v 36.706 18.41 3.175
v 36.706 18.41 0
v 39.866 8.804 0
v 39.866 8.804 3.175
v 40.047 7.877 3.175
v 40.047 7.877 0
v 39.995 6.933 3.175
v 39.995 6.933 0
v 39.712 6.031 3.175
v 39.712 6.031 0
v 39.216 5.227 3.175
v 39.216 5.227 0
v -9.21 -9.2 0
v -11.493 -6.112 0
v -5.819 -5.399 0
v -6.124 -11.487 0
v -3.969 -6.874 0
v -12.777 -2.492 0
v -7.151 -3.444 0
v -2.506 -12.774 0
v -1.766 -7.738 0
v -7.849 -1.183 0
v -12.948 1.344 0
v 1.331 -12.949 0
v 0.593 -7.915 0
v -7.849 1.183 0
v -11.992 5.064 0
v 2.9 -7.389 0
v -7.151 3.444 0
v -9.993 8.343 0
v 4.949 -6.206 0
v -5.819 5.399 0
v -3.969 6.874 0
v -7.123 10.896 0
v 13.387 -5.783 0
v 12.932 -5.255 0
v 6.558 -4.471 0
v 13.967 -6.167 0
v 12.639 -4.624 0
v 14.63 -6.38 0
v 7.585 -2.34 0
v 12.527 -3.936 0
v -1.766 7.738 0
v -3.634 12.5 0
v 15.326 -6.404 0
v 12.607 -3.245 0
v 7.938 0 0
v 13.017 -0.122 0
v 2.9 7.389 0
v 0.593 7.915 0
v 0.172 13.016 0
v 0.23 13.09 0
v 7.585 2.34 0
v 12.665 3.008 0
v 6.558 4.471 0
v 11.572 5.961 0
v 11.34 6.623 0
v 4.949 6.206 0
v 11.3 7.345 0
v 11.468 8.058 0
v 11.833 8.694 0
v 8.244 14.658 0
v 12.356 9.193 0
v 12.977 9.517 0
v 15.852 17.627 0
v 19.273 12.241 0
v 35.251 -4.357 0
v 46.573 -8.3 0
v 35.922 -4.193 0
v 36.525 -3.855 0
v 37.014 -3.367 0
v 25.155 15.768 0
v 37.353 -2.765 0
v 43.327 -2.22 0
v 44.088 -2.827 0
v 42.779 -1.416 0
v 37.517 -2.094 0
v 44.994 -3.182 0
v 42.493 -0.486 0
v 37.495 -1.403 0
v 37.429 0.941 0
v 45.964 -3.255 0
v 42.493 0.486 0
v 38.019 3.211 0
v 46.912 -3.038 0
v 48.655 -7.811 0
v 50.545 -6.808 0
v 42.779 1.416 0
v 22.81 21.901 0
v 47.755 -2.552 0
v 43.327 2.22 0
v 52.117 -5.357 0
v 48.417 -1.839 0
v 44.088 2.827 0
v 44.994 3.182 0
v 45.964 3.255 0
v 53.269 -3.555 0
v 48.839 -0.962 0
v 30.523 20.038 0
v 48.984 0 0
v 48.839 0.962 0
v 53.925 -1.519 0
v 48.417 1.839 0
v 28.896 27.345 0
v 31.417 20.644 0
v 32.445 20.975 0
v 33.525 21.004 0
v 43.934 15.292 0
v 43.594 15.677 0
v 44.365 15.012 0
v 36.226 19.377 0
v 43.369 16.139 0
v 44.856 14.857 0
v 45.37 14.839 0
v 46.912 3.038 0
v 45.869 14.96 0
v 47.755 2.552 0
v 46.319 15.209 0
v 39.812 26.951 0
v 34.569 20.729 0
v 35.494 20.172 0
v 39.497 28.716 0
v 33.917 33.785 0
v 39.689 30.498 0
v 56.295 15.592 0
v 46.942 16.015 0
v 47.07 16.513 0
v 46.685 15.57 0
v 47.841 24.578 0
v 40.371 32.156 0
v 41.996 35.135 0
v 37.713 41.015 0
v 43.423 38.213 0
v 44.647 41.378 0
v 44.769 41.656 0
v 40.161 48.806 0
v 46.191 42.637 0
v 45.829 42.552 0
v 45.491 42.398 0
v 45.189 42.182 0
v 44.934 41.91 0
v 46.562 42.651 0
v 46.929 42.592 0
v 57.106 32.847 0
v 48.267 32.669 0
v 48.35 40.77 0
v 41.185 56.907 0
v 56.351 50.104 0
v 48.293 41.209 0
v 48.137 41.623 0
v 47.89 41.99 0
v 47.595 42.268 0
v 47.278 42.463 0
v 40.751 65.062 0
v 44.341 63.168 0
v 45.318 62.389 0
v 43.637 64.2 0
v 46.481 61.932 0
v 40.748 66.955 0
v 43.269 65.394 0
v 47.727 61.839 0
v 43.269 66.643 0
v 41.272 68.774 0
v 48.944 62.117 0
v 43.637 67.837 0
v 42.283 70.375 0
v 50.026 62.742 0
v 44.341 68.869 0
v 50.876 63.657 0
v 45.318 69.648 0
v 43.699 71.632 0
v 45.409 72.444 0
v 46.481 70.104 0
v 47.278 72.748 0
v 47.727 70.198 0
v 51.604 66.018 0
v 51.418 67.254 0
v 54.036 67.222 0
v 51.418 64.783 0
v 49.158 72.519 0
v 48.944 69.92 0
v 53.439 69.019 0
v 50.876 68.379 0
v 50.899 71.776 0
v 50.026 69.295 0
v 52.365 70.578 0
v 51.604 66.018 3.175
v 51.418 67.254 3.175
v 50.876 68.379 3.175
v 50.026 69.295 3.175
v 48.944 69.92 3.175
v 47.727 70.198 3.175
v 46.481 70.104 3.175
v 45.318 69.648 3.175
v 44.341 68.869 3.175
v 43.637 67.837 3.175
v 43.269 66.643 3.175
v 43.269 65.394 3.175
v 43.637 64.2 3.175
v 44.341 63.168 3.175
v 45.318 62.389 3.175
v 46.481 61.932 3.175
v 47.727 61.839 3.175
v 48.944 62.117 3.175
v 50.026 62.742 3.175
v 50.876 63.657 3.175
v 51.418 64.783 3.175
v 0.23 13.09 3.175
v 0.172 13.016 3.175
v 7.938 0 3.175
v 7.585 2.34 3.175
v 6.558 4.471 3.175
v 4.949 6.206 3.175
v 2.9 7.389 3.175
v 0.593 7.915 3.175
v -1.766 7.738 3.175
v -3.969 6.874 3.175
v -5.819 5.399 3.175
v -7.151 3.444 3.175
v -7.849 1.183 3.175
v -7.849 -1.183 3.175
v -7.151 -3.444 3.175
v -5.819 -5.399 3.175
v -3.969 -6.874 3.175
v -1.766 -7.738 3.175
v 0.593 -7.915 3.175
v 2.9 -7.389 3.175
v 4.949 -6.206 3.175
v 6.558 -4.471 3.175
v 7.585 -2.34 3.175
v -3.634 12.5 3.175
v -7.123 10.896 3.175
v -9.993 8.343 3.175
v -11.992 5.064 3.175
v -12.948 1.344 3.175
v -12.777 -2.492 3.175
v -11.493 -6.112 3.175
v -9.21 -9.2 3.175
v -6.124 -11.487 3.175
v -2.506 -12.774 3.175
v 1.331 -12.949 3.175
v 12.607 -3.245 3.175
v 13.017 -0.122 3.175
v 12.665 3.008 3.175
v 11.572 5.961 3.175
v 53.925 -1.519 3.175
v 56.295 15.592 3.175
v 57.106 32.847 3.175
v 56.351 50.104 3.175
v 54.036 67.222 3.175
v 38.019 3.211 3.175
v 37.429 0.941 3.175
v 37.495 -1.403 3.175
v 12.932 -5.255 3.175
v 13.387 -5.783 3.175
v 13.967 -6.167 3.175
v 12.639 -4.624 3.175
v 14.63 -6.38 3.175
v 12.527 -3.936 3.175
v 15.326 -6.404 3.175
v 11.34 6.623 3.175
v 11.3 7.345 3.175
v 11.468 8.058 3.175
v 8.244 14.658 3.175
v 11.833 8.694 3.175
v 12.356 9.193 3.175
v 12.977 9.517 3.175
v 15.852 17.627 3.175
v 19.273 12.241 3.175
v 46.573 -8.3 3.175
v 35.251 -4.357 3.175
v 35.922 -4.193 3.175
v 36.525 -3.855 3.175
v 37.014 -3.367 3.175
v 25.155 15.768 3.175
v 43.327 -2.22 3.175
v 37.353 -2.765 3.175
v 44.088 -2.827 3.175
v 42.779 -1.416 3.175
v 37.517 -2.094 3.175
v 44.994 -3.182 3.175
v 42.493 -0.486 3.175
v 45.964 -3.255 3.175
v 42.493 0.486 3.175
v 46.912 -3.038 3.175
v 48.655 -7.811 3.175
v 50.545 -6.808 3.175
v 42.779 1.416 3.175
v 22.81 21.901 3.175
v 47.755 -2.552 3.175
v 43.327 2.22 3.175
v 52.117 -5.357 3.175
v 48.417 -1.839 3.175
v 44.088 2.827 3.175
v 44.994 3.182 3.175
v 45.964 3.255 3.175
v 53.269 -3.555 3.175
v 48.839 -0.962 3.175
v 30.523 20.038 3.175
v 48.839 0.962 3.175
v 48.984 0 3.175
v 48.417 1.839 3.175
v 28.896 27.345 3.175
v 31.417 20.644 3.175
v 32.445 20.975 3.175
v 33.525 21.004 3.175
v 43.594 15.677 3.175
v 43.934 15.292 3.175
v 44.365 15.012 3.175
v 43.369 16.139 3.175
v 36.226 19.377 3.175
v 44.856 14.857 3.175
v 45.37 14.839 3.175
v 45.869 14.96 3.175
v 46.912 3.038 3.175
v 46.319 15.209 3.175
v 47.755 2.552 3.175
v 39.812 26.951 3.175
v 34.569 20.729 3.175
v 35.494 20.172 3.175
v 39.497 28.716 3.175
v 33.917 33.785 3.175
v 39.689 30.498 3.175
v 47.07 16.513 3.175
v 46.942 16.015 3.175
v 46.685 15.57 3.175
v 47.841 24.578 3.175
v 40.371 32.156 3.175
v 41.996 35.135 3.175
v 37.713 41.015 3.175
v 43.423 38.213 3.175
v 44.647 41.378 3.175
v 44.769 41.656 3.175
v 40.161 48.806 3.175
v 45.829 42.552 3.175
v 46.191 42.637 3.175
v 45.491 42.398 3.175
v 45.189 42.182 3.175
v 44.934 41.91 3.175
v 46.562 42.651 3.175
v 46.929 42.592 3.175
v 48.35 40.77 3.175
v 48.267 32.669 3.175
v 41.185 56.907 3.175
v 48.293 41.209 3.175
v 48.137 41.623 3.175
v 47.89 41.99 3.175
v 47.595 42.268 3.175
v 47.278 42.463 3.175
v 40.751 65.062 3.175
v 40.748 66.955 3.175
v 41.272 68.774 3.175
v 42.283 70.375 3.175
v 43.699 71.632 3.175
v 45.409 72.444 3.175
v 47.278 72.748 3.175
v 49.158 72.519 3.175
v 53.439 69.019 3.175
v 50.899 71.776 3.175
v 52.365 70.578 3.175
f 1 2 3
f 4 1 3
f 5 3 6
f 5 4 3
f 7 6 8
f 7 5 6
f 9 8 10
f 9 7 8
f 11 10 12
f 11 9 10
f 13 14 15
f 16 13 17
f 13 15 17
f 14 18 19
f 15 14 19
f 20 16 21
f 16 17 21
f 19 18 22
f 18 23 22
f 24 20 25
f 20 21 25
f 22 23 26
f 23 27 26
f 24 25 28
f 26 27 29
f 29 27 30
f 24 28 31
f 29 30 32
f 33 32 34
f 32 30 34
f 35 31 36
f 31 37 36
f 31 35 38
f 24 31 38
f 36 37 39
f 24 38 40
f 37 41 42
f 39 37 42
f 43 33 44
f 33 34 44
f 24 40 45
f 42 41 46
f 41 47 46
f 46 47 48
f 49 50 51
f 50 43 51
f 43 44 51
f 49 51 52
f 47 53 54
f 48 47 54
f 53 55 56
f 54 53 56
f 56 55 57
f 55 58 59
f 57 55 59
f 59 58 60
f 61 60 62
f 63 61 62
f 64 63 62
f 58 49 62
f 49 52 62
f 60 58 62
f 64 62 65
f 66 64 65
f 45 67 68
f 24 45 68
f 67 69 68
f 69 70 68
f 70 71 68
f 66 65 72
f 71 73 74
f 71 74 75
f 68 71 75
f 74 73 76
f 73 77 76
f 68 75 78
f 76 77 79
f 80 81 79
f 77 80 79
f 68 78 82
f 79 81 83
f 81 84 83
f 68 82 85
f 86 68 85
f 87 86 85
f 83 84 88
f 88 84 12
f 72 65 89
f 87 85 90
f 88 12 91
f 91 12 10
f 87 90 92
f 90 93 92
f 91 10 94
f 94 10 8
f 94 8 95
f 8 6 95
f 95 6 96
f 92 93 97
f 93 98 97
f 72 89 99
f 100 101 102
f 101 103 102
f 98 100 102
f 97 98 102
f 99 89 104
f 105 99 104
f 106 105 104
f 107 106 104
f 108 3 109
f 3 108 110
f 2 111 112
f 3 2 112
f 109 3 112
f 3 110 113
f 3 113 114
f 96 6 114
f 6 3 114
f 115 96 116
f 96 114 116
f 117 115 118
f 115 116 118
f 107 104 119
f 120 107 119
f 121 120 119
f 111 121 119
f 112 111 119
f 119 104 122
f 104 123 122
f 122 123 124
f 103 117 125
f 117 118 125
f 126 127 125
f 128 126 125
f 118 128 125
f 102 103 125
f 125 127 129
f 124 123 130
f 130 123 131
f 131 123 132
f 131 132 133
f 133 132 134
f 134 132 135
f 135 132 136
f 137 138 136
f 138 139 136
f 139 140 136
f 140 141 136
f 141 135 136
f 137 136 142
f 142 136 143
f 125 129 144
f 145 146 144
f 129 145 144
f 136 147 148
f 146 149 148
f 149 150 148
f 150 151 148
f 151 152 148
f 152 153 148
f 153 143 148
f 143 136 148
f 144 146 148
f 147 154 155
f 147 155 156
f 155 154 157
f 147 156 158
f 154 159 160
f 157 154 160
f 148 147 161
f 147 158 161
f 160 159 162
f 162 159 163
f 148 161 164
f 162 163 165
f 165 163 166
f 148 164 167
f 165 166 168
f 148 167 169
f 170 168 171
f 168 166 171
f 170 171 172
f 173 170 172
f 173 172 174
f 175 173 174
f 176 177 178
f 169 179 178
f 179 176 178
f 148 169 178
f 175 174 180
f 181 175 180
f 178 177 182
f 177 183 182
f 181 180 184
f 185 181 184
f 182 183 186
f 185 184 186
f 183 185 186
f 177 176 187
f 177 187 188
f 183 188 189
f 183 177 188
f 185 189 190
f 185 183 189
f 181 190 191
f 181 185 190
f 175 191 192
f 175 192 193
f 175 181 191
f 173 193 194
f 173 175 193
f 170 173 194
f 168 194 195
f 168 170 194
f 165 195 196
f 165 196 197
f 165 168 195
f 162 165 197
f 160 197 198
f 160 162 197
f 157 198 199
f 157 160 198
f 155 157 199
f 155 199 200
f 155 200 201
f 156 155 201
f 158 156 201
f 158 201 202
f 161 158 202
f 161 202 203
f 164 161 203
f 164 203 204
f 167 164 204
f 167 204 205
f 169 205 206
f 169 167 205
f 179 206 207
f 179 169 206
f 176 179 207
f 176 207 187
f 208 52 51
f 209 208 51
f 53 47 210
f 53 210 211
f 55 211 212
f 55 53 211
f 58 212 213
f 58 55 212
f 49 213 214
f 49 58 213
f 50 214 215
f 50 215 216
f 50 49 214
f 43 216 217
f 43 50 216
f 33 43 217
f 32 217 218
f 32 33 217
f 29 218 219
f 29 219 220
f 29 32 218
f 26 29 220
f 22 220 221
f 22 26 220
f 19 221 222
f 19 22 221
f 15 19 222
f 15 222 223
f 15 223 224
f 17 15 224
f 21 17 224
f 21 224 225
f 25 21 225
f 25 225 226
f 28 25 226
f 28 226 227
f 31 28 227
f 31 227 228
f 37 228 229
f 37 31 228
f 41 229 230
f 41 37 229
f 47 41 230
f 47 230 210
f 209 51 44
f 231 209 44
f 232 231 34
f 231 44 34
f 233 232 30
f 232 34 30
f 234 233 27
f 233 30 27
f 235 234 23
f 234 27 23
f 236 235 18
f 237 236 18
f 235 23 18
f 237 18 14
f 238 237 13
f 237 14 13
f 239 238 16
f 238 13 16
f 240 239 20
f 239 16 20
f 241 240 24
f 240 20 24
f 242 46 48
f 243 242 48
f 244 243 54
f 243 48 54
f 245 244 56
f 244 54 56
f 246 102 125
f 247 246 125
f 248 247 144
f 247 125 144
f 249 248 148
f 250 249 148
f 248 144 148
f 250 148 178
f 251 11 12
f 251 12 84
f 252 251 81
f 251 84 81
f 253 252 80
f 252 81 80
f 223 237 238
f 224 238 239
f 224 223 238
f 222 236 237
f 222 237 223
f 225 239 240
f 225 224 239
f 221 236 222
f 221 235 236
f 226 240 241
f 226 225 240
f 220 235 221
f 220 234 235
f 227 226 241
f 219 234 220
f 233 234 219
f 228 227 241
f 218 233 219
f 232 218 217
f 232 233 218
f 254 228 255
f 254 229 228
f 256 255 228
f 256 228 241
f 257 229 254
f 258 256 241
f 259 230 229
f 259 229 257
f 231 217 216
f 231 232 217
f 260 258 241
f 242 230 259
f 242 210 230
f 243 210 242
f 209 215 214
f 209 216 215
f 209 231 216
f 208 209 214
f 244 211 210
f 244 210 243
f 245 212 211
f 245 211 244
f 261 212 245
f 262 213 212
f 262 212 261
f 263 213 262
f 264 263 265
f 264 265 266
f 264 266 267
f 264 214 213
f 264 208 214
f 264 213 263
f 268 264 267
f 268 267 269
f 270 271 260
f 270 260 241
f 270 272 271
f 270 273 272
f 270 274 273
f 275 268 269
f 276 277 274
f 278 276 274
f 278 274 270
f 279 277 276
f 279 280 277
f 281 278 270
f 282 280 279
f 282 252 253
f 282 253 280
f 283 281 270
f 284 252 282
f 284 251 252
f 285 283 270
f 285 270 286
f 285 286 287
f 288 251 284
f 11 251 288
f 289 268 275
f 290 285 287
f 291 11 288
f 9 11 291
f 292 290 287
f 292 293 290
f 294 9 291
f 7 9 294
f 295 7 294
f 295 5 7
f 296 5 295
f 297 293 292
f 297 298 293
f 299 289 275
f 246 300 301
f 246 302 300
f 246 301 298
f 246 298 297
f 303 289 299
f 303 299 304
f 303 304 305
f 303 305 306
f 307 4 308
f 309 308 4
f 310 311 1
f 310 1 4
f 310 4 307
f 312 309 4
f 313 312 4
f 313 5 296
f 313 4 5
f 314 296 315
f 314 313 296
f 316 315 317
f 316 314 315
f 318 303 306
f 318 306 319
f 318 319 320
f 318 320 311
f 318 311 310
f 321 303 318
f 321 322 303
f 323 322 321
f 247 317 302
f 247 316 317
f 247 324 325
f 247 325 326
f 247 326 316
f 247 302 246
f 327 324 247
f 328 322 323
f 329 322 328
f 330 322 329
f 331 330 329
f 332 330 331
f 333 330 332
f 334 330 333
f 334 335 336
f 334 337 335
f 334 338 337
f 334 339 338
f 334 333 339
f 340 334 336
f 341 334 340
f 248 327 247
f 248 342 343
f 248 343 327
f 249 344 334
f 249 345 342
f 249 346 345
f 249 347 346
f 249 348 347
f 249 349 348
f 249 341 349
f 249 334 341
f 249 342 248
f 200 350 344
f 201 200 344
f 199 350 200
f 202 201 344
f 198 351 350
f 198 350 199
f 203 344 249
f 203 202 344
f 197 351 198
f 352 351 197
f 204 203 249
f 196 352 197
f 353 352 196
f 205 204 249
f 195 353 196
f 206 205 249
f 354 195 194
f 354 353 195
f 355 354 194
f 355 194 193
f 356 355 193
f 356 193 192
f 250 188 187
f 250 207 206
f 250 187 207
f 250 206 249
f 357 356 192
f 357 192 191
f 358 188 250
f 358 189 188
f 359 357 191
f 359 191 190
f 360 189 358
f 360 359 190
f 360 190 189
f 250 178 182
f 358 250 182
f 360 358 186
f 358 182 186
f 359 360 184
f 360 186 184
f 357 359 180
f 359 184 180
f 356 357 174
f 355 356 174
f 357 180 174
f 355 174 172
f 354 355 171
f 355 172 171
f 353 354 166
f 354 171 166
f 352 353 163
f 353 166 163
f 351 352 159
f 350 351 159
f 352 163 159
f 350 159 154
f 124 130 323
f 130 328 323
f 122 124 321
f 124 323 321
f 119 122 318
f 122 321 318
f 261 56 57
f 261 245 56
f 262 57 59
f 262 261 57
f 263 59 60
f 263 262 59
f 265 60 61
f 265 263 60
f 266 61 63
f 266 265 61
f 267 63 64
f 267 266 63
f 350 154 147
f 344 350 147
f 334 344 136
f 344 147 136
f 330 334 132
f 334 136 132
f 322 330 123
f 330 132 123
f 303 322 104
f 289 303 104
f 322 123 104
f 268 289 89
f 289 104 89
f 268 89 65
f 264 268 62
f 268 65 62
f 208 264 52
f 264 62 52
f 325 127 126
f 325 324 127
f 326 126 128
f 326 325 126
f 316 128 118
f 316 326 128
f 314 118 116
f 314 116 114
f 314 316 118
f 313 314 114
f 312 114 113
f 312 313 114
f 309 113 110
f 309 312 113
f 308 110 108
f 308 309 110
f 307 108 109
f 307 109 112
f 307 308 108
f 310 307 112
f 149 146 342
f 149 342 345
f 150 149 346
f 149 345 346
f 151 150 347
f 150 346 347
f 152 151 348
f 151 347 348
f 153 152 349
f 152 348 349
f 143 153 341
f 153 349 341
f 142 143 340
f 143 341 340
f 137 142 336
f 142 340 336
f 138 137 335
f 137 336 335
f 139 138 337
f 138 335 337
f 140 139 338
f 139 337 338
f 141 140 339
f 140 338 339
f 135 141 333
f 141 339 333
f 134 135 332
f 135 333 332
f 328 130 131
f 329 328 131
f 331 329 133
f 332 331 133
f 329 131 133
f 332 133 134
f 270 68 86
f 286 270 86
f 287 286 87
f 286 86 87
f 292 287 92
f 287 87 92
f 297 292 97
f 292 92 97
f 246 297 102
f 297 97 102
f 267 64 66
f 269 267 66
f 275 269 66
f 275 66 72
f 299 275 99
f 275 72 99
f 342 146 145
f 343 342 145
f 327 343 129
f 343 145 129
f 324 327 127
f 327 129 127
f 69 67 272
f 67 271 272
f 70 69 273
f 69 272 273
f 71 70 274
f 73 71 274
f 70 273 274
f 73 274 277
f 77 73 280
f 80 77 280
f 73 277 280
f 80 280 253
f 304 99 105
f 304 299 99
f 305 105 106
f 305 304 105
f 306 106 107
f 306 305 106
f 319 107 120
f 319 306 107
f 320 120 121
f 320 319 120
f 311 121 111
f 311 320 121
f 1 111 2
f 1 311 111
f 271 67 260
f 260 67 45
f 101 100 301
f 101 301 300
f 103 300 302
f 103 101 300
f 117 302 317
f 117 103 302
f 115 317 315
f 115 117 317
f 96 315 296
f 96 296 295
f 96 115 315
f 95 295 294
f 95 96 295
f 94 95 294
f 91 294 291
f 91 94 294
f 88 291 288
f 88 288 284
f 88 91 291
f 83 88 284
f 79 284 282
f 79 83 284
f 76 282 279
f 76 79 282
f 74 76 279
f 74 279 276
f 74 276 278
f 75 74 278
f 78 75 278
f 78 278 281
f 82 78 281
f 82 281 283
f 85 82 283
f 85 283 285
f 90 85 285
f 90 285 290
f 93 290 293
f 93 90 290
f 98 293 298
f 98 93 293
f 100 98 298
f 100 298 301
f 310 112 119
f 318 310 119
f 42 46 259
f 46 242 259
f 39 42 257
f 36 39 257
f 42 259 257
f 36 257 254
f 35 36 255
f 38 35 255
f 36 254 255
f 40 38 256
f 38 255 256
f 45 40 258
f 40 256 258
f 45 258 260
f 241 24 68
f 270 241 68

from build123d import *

# Parameters (mm, degrees)
SKETCH2_R           = 7.9375
SKETCH2_R_2         = 3.2639
SKETCH2_R_3         = 4.191
BOSS_EXTRUDE1_DEPTH = 3.175
FILLET1_R           = 2.54
FILLET2_R           = 3.81
FILLET3_R           = 1.905
FILLET4_R           = 6.35


with BuildPart() as part:
    # Sketch2 → Boss-Extrude1 (new body)
    with BuildSketch(Plane.XY):
        with BuildLine():
            ThreePointArc((54.035830718, 67.22198524), (46.333024889, 72.662028043), (40.750647472, 65.061742146))
            ThreePointArc((40.750647472, 65.061742146), (31.550758366, 30.452598432), (0.230104832, 13.090356345))
            Line((0.230104832, 13.090356345), (0.171615761, 13.016368706))
            ThreePointArc((0.171615761, 13.016368706), (-13.004550196, -0.580500165), (1.330677778, -12.949308974))
            Line((1.330677778, -12.949308974), (46.572932, -8.300191215))
            ThreePointArc((46.572932, -8.300191215), (51.37742802, -6.133039654), (53.924522362, -1.518709983))
            ThreePointArc((53.924522362, -1.518709983), (57.106411985, 32.846575472), (54.035830718, 67.22198524))
        make_face()
        Circle(SKETCH2_R, mode=Mode.SUBTRACT)
        with BuildLine():
            ThreePointArc((9.848859751, 8.512066016), (23.445327069, 14.632175726), (34.749899024, 24.354640398))
            Line((34.749899024, 24.354640398), (40.595697266, 6.584997244))
            ThreePointArc((40.595697266, 6.584997244), (37.546758205, 1.678923993), (38.414831114, -4.031770672))
            Line((38.414831114, -4.031770672), (11.074870198, -6.841239387))
            ThreePointArc((11.074870198, -6.841239387), (12.976194182, 1.036190528), (9.848859751, 8.512066016))
        make_face(mode=Mode.SUBTRACT)
        with Locations((45.72, 0)):
            Circle(SKETCH2_R_2, mode=Mode.SUBTRACT)
        with BuildLine():
            Line((45.933946154, 8.34115665), (38.882442516, 29.775817606))
            ThreePointArc((38.882442516, 29.775817606), (45.039190515, 42.544935267), (47.523781163, 56.501393309))
            ThreePointArc((47.523781163, 56.501393309), (48.257752726, 32.370804269), (45.933946154, 8.34115665))
        make_face(mode=Mode.SUBTRACT)
        with Locations((47.413333333, 66.018287029)):
            Circle(SKETCH2_R_3, mode=Mode.SUBTRACT)
    extrude(amount=BOSS_EXTRUDE1_DEPTH)

    # Fillet1
    fillet1_edges = [part.edges().sort_by_distance(p)[0] for p in [
        (38.414831114, -4.031770672, 1.5875),
        (9.848859751, 8.512066016, 1.5875),
        (11.074870198, -6.841239387, 1.5875),
    ]]
    fillet(fillet1_edges, radius=FILLET1_R)

    # Fillet2
    fillet2_edges = [part.edges().sort_by_distance(p)[0] for p in [
        (40.595697266, 6.584997244, 1.5875),
        (34.749899024, 24.354640398, 1.5875),
    ]]
    fillet(fillet2_edges, radius=FILLET2_R)

    # Fillet3
    fillet3_edges = [part.edges().sort_by_distance(p)[0] for p in [
        (47.523781163, 56.501393309, 1.5875),
        (45.933946154, 8.34115665, 1.5875),
    ]]
    fillet(fillet3_edges, radius=FILLET3_R)

    # Fillet4
    fillet4_edges = [part.edges().sort_by_distance(p)[0] for p in [
        (38.882442516, 29.775817606, 1.5875),
    ]]
    fillet(fillet4_edges, radius=FILLET4_R)


solid = part.part
